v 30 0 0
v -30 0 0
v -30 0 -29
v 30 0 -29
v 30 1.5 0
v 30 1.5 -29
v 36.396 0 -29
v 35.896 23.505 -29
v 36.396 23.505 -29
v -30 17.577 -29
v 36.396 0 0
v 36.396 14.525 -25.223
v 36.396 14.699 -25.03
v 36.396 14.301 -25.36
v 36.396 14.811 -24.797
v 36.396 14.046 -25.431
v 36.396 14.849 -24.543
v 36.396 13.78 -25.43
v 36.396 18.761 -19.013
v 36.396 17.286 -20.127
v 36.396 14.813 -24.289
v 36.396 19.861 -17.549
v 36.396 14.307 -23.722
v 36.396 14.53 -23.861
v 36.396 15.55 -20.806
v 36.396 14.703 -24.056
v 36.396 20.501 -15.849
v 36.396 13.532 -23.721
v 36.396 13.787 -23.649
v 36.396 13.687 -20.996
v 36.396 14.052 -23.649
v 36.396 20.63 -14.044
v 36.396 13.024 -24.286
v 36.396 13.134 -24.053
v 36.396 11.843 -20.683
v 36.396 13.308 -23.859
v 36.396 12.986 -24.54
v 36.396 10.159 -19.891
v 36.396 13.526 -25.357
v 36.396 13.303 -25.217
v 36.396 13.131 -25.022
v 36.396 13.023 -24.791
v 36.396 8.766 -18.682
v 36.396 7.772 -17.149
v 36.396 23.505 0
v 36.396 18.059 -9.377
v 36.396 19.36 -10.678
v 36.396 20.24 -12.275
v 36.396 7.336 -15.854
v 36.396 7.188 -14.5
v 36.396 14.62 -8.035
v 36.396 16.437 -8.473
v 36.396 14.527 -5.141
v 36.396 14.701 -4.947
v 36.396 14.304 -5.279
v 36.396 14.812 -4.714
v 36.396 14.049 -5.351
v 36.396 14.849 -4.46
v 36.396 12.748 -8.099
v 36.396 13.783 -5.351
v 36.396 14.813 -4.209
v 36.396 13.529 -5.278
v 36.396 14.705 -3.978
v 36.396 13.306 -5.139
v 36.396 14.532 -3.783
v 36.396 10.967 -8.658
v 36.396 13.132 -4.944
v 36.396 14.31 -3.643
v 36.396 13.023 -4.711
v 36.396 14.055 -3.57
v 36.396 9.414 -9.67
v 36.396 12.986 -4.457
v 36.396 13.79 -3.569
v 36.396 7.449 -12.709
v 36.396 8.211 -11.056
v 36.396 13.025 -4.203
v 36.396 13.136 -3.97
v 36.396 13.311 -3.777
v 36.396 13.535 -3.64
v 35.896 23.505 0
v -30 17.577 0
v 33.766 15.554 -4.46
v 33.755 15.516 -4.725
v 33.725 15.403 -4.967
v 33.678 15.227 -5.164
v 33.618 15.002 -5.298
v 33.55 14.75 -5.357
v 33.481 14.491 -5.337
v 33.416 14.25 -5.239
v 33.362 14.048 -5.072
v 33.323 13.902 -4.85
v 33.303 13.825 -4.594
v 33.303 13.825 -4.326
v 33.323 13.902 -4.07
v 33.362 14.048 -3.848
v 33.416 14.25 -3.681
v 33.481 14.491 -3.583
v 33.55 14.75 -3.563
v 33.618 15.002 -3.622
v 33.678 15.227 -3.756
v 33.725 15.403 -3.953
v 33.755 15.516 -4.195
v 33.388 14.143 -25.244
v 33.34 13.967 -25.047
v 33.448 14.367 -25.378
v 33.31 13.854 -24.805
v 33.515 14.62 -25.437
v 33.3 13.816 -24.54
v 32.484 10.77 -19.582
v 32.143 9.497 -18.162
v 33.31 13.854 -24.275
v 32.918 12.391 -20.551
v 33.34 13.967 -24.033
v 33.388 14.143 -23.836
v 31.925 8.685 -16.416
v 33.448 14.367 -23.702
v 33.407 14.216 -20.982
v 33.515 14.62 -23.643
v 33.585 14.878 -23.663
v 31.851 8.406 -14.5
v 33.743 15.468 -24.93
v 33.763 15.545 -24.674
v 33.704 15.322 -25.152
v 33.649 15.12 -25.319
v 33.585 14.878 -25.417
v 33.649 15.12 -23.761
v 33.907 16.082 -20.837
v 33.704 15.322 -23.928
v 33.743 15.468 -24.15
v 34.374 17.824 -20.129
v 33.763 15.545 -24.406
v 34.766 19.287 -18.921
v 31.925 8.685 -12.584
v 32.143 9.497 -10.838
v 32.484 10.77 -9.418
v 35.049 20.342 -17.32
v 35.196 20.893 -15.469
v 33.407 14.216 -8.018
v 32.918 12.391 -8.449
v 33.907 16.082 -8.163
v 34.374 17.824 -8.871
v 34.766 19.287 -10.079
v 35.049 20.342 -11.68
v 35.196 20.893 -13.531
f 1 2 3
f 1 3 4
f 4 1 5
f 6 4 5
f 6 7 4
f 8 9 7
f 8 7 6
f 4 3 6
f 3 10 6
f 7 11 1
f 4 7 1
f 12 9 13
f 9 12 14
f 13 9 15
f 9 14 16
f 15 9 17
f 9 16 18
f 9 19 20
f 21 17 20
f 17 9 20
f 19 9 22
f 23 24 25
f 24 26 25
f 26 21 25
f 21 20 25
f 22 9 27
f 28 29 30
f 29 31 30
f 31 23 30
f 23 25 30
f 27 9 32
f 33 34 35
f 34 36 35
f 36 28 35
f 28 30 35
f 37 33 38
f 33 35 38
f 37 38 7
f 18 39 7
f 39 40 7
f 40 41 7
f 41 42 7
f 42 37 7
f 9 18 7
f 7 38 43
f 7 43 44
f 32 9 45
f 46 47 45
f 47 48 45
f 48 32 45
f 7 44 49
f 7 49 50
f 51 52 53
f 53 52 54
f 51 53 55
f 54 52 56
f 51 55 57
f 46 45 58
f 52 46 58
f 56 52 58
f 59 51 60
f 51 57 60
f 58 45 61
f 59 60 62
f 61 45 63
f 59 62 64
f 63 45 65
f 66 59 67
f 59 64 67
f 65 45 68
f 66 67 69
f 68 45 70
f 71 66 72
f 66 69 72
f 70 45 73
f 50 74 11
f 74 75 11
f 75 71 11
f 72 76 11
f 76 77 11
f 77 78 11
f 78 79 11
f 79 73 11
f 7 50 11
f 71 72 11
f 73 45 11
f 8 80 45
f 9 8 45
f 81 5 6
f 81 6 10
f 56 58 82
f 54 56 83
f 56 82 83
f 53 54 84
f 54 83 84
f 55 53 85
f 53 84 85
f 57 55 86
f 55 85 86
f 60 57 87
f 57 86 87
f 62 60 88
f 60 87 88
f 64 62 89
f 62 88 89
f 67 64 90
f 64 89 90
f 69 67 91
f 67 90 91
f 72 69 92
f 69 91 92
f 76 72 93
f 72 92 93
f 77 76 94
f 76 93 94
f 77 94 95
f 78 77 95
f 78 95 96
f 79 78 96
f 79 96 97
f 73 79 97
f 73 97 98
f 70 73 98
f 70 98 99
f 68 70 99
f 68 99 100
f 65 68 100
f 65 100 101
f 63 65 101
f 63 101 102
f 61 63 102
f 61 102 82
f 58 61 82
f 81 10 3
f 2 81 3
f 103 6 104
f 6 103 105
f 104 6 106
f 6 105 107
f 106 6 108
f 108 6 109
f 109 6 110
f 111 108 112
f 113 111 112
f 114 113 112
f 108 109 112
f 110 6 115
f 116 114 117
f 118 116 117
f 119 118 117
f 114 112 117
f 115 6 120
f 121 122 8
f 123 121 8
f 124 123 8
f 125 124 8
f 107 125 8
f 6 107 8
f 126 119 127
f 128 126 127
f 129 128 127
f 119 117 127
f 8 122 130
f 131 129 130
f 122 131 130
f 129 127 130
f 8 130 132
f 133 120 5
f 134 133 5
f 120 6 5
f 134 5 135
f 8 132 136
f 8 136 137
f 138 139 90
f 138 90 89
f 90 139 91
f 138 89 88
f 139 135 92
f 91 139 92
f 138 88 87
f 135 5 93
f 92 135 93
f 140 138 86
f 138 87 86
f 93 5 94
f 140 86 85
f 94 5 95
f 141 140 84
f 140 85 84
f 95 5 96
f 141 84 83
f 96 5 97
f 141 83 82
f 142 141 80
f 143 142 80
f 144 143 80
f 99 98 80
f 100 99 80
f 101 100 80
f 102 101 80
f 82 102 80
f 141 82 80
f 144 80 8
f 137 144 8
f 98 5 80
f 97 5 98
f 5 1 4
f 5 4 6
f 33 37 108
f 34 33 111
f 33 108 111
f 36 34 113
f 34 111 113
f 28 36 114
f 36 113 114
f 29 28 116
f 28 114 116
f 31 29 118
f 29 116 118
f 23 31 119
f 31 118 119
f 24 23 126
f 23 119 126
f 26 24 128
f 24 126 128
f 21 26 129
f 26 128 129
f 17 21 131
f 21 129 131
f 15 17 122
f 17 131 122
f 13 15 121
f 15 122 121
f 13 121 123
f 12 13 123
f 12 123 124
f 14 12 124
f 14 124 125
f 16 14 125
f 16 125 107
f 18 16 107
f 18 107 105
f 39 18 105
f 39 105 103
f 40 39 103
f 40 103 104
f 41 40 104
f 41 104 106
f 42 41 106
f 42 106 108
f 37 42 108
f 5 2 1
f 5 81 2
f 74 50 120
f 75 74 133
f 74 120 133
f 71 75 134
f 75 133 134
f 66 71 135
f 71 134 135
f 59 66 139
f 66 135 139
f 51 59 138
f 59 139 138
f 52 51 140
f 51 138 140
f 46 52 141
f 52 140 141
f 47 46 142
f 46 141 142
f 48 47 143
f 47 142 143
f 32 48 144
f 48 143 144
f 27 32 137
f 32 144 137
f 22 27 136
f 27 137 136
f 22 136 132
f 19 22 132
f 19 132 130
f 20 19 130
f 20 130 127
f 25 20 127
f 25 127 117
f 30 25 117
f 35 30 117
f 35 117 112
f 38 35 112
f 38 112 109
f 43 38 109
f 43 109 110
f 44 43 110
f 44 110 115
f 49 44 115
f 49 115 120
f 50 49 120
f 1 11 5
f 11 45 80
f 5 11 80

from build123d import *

# Parameters (mm, degrees)
SALIENTE_EXTRUIR1_DEPTH = 29
SALIENTE_EXTRUIR2_DEPTH = 29
CROQUIS6_R              = 6.5
CORTAR_EXTRUIR1_DEPTH   = 72.523490549
CROQUIS9_R              = 6.5
CROQUIS9_R_2            = 0.9
CORTAR_EXTRUIR2_DEPTH   = 72.523490549


with BuildPart() as part:
    # Croquis1 → Saliente-Extruir1 (new body)
    with BuildSketch(Plane.XY):
        Polygon((-30, 0), (30, 0), (30, 1.5), (-30, 17.576951546), align=None)
    extrude(amount=-SALIENTE_EXTRUIR1_DEPTH)


with BuildPart() as body_2:
    # Croquis3 → Saliente-Extruir2 (new body)
    with BuildSketch(Plane.XY):
        Polygon((30, 0), (30, 1.5), (35.89617112, 23.50481019), (36.39617112, 23.50481019), (36.39617112, 0), align=None)
    extrude(amount=-SALIENTE_EXTRUIR2_DEPTH)

    # Croquis6 → Cortar-Extruir1 (cut, through all)
    with BuildSketch(Plane(origin=(27.615381057, -7.399519053, 0), x_dir=(0, 0, 1), z_dir=(-0.9659258262890692, 0.25881904510251774, 0))):
        with Locations(Location((-14.5, 22.863460093, 0), (0, 0, 270))):
            Circle(CROQUIS6_R)
    extrude(amount=-CORTAR_EXTRUIR1_DEPTH, mode=Mode.SUBTRACT)

    # Croquis9 → Cortar-Extruir2 (cut, through all)
    with BuildSketch(Plane(origin=(27.615381057, -7.399519053, 0), x_dir=(0, 0, 1), z_dir=(-0.9659258262890692, 0.25881904510251774, 0))):
        with Locations(Location((-14.5, 22.863460093, 0), (0, 0, 270))):
            Circle(CROQUIS9_R)
        with Locations(Location((-24.54, 22.863460093, 0), (0, 0, 270))):
            Circle(CROQUIS9_R_2)
        with Locations(Location((-4.46, 22.863460093, 0), (0, 0, 90))):
            Circle(CROQUIS9_R_2)
    extrude(amount=-CORTAR_EXTRUIR2_DEPTH, mode=Mode.SUBTRACT)


solid = Compound([part.part, body_2.part])
